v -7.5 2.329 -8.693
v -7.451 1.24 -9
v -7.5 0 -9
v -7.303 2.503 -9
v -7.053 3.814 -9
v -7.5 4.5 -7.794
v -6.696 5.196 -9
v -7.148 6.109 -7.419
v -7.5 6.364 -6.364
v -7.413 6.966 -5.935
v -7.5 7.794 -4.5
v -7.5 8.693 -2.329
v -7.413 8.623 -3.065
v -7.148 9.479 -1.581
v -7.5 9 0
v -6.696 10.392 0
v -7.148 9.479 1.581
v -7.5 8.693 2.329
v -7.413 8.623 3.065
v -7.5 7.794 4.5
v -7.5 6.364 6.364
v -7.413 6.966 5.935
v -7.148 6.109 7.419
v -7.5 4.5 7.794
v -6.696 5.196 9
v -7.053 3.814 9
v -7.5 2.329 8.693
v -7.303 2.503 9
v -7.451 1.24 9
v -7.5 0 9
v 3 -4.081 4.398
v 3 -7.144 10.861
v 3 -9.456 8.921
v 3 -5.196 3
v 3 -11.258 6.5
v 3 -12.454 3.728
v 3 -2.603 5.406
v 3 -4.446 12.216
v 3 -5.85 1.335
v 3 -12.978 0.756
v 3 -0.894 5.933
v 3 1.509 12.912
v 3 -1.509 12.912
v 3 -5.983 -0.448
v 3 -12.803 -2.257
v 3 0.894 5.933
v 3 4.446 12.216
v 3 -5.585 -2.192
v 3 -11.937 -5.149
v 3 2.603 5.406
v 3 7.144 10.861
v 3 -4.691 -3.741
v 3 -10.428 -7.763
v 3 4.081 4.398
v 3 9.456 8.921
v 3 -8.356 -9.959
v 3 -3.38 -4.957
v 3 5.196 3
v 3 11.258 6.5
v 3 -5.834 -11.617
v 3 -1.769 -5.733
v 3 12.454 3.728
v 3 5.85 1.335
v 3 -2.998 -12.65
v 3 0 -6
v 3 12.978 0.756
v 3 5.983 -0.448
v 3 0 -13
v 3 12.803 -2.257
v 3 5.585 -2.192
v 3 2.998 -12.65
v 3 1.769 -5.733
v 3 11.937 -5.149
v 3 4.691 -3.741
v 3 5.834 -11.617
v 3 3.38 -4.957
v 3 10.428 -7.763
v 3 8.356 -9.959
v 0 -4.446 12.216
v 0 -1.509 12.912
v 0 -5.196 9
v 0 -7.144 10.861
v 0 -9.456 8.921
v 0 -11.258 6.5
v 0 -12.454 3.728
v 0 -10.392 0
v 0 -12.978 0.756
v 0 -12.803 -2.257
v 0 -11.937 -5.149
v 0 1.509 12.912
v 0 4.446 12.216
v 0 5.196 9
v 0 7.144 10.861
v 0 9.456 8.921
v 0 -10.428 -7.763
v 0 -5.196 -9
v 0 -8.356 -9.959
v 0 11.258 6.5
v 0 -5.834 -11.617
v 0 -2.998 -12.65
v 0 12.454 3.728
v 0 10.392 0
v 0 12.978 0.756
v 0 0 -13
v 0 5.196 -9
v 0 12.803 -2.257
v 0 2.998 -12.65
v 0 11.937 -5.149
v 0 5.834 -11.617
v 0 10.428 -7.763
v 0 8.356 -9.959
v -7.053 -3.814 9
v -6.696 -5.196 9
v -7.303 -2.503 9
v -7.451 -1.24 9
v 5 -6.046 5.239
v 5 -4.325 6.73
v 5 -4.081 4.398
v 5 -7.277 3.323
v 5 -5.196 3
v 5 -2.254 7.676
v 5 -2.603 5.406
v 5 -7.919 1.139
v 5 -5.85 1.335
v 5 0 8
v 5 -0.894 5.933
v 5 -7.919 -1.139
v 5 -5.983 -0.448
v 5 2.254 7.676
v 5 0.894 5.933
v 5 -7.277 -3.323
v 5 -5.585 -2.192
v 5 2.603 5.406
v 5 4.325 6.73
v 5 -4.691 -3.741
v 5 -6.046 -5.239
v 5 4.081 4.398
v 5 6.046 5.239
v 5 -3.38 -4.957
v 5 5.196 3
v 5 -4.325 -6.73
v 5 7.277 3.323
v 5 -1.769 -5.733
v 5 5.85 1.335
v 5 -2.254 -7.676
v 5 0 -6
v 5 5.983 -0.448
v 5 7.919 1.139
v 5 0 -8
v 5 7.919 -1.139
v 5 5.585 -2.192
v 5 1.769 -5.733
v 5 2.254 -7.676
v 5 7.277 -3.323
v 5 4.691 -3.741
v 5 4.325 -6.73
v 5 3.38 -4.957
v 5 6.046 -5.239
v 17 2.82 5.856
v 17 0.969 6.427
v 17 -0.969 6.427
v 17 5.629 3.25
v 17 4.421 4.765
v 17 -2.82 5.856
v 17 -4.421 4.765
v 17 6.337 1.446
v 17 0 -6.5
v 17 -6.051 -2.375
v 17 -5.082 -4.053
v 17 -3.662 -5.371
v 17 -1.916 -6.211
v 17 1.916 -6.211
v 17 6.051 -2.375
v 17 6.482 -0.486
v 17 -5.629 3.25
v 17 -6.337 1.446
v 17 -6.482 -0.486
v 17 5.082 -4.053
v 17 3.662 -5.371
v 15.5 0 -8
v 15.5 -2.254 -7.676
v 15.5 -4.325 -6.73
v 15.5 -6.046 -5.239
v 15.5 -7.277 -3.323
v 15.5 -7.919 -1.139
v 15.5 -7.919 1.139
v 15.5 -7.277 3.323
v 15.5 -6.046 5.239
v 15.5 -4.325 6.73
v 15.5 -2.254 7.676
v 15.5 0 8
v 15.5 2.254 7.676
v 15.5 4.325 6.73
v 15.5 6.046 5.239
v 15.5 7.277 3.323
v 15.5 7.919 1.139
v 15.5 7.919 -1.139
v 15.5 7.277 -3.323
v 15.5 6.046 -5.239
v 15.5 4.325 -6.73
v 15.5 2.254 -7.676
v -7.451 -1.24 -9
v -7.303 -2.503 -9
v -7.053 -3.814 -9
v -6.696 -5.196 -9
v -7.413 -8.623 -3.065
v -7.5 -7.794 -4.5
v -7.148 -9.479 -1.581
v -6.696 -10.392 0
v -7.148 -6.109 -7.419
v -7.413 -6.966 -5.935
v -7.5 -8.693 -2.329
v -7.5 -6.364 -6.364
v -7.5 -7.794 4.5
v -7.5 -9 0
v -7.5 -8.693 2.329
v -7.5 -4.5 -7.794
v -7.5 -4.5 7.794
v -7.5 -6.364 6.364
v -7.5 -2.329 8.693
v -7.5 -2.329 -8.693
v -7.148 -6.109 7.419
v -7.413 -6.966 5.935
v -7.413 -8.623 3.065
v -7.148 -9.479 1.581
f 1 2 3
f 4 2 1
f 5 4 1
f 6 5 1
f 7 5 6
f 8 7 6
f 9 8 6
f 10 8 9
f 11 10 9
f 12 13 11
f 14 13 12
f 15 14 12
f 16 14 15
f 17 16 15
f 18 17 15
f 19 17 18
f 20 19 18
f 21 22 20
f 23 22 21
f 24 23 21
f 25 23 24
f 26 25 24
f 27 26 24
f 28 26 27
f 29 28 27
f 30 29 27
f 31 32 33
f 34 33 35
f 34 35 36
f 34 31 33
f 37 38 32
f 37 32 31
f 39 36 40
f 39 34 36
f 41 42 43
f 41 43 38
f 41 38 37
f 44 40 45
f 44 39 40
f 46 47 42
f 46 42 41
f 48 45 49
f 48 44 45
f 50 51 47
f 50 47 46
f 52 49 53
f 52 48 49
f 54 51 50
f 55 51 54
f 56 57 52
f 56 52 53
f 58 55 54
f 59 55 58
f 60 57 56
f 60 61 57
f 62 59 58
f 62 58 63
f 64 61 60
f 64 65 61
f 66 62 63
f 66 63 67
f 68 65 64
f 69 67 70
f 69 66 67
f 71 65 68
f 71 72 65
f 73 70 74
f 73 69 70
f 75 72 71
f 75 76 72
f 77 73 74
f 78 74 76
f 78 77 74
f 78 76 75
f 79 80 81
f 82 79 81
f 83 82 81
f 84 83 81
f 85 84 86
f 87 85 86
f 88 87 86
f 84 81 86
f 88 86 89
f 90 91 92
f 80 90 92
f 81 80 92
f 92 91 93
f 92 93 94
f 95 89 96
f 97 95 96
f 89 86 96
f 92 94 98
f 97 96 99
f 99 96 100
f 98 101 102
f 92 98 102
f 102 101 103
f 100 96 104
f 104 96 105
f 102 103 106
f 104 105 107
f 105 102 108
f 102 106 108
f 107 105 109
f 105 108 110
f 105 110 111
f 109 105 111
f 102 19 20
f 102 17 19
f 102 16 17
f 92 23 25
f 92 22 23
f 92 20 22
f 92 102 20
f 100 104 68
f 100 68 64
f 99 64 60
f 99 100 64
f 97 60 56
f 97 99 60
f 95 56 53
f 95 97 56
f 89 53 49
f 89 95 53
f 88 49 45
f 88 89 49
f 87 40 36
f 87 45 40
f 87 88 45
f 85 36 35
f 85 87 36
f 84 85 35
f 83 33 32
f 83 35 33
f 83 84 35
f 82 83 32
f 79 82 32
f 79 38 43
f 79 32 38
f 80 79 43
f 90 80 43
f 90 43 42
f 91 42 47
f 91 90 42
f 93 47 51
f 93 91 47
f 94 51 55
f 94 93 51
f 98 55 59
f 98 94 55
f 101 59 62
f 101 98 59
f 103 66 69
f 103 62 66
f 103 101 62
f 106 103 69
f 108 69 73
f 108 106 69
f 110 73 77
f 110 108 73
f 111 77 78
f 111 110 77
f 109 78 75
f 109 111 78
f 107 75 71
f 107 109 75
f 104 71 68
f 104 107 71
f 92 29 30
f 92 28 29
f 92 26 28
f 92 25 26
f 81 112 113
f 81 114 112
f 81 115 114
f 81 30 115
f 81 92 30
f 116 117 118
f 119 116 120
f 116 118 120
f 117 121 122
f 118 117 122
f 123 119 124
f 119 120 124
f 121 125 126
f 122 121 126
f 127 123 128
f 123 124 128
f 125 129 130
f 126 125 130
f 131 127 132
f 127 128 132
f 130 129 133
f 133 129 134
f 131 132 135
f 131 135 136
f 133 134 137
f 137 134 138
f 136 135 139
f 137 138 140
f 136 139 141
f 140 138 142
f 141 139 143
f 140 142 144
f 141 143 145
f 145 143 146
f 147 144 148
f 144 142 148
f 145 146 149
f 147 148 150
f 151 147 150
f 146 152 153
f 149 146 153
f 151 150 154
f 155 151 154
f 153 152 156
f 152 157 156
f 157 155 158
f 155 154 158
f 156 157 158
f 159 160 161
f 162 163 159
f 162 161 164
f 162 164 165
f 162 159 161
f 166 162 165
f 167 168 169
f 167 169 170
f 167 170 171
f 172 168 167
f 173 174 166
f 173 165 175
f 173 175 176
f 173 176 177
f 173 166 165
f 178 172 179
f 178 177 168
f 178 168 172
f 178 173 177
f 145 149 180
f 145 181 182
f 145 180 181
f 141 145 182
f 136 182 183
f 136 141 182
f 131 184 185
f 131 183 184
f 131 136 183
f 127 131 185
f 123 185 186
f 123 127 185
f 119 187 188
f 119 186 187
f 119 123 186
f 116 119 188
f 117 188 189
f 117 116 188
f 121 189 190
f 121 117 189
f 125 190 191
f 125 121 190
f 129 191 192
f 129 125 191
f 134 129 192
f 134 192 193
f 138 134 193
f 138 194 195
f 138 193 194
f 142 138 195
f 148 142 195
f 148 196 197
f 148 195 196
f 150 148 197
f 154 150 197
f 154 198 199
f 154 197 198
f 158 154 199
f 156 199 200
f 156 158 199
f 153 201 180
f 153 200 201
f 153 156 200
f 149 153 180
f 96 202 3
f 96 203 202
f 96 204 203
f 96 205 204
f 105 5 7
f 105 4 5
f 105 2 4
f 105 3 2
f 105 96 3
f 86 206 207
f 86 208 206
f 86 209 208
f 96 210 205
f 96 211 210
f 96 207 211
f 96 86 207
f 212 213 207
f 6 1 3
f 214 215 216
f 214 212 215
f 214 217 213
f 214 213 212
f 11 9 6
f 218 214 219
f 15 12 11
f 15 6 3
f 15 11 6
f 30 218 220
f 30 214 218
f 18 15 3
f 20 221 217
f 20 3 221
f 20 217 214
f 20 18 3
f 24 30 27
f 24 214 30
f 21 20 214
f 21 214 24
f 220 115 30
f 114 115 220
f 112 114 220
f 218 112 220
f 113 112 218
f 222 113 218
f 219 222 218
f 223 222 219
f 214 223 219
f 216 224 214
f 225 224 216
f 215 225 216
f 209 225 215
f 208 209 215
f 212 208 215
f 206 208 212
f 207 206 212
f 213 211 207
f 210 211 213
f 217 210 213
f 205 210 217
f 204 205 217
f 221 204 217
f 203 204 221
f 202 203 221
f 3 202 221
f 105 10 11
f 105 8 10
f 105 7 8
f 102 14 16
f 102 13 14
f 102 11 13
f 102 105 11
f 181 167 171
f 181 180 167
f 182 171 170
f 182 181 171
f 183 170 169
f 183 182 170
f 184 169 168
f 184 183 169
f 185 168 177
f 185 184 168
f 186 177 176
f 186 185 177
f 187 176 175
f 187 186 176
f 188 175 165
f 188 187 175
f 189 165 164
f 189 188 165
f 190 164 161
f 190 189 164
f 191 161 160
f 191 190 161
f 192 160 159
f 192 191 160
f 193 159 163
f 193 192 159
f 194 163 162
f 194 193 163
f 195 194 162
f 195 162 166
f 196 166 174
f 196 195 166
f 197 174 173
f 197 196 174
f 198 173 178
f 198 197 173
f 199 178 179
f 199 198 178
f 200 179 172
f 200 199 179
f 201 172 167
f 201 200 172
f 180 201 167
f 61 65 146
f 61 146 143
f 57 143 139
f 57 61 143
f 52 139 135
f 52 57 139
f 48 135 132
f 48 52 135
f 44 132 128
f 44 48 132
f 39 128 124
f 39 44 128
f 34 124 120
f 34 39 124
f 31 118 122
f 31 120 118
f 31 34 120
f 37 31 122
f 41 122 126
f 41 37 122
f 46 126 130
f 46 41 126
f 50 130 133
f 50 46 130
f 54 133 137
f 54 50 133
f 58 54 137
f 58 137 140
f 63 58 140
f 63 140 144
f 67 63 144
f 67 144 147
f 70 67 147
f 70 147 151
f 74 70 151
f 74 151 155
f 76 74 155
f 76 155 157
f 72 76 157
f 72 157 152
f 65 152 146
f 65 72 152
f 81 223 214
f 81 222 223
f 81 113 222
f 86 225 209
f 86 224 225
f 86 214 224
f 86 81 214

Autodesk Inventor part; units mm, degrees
ref_plane "YZ Plane" through (0, 0, 0) normal (1, 0, 0) x (0, 1, 0)
sketch "草图1" plane through (0, 0, 0) normal (0, 0, 1) x (1, 0, 0)
  line L0 (0, 6) -> (45, 6)
  line L1 (45, 6) -> (45, 0)
  line L2 (45, 0) -> (0, 0)
  line L3 (-9, 0) -> (54, 0) projected
  line L4 (0, -1.2) -> (0, 7.2) projected
  line L5 (0, 6) -> (0, 0)
  dimension "d2" = 12
  dimension "d59" = 45
ref_plane "工作平面2" through (0, 0, 0) normal (-1, 0, 0) x (0, 0, 1)
sketch "草图2" plane through (0, 0, 0) normal (-1, 0, 0) x (0, 0, 1)
  line L0 (0, 10.3923) -> (9, 5.1962)
  line L1 (9, 5.1962) -> (9, -5.1962)
  line L2 (9, -5.1962) -> (0, -10.3923)
  line L3 (0, -10.3923) -> (-9, -5.1962)
  line L4 (-9, -5.1962) -> (-9, 5.1962)
  line L5 (-9, 5.1962) -> (0, 10.3923)
  line L6 (-12.6, 0) -> (12.6, 0) projected
  line L7 (0, 14.5492) -> (0, -14.5492) projected
  point P0 (0, 0)
  point P1 (0, 0)
  dimension "d11" = 18
extrude "头" add sketch "草图2" along normal blind 7.5
sketch "草图4" plane through (0, 0, 0) normal (0, 0, 1) x (1, 0, 0)
  line L0 (-6.4608, 10.8) -> (-7.5, 9)
  line L1 (-1.1, 0) -> (-0.234, 0)
  line L2 (-18, 0) -> (55.5, 0) projected
  line L3 (-7.5, 10.8) -> (-6.4608, 10.8)
  line L4 (-7.5, 9) -> (-7.5, 10.8)
  line L5 (0, 12.96) -> (0, -2.16) projected
  dimension "d65" = 18
  dimension "d67" = 30
  dimension "d68" = 21.6
  dimension "d69" = 7.5
revolve "倒角1" cut sketch "草图4" angle 360 about axis through (-1.1, 0, 0) along (1, 0, 0)
ref_plane "Work Plane1" through (1.525, 0, 0) normal (0, 0, 1) x (1, 0, 0)
sketch "草图7" plane through (0, 0, 0) normal (1, 0, 0) x (0, 0, -1)
  circle A0 centre (0, 0) radius 13
  dimension "d74" = 26
extrude "拉伸5" add sketch "草图7" along normal blind 3
sketch "草图8" plane through (3, 0, 0) normal (1, 0, 0) x (0, 0, -1)
  circle A0 centre (0, 0) radius 13 projected
  circle A1 centre (0, 0) radius 6
  dimension "d77" = 12
extrude "拉伸6" add sketch "草图8" along normal blind 2 contours A1
sketch "草图9" plane through (5, 0, 0) normal (1, 0, 0) x (0, 0, -1)
  circle A0 centre (0, 0) radius 8
  dimension "d80" = 16
extrude "拉伸7" add sketch "草图9" along normal blind 12
chamfer "倒角2" distance 1.5 angle 45 1 edges at (17, 0, 8)
thread "螺纹3" size "M16x1.5" class "6g" standard "GB Metric profile" length 20
equation "\"d2\" = GD"
equation "\"d59\" = NLG"
equation "\"d11\" = SW"
equation "\"d3\" = KOH"
equation "\"d65\" = SW"
equation "\"d67\" = ANG1"
equation "\"d68\" = 1.2 * SW"
equation "\"d69\" = KOH"
equation "\"NLG\" = 45"
equation "\"GD\" = NND"
equation "\"BDM\" = NND"
equation "\"KOH\" = 7.5"
equation "\"SW\" = 18"
equation "\"SW0\" = SW"
equation "\"SPD\" = NND - 1.2269 * PTC"
equation "\"SD2\" = NND"
equation "\"SD\" = 0"
equation "\"ANG1\" = 30deg"
equation "\"GAL\" = 0.61345 * PTC"
equation "\"GUL\" = 0.61345 * PTC"
equation "\"RR\" = 0.6"
equation "\"RR1\" = 0.1"
equation "\"WFT\" = 0"
equation "\"GD1\" = THREADDIA - 1.2269 * PTC"
equation "\"THREADDIA\" = 12"
equation "\"SDH\" = SW"
equation "\"TOA\" = 30deg"
equation "\"FAWI\" = 90deg"
equation "\"PTC\" = 1.75"
equation "\"NND\" = 12"
equation "\"E0\" = 1.155 * SW"
properties part number "六角螺栓 GB/T 5780 M12 x 45" material "钢，软"
